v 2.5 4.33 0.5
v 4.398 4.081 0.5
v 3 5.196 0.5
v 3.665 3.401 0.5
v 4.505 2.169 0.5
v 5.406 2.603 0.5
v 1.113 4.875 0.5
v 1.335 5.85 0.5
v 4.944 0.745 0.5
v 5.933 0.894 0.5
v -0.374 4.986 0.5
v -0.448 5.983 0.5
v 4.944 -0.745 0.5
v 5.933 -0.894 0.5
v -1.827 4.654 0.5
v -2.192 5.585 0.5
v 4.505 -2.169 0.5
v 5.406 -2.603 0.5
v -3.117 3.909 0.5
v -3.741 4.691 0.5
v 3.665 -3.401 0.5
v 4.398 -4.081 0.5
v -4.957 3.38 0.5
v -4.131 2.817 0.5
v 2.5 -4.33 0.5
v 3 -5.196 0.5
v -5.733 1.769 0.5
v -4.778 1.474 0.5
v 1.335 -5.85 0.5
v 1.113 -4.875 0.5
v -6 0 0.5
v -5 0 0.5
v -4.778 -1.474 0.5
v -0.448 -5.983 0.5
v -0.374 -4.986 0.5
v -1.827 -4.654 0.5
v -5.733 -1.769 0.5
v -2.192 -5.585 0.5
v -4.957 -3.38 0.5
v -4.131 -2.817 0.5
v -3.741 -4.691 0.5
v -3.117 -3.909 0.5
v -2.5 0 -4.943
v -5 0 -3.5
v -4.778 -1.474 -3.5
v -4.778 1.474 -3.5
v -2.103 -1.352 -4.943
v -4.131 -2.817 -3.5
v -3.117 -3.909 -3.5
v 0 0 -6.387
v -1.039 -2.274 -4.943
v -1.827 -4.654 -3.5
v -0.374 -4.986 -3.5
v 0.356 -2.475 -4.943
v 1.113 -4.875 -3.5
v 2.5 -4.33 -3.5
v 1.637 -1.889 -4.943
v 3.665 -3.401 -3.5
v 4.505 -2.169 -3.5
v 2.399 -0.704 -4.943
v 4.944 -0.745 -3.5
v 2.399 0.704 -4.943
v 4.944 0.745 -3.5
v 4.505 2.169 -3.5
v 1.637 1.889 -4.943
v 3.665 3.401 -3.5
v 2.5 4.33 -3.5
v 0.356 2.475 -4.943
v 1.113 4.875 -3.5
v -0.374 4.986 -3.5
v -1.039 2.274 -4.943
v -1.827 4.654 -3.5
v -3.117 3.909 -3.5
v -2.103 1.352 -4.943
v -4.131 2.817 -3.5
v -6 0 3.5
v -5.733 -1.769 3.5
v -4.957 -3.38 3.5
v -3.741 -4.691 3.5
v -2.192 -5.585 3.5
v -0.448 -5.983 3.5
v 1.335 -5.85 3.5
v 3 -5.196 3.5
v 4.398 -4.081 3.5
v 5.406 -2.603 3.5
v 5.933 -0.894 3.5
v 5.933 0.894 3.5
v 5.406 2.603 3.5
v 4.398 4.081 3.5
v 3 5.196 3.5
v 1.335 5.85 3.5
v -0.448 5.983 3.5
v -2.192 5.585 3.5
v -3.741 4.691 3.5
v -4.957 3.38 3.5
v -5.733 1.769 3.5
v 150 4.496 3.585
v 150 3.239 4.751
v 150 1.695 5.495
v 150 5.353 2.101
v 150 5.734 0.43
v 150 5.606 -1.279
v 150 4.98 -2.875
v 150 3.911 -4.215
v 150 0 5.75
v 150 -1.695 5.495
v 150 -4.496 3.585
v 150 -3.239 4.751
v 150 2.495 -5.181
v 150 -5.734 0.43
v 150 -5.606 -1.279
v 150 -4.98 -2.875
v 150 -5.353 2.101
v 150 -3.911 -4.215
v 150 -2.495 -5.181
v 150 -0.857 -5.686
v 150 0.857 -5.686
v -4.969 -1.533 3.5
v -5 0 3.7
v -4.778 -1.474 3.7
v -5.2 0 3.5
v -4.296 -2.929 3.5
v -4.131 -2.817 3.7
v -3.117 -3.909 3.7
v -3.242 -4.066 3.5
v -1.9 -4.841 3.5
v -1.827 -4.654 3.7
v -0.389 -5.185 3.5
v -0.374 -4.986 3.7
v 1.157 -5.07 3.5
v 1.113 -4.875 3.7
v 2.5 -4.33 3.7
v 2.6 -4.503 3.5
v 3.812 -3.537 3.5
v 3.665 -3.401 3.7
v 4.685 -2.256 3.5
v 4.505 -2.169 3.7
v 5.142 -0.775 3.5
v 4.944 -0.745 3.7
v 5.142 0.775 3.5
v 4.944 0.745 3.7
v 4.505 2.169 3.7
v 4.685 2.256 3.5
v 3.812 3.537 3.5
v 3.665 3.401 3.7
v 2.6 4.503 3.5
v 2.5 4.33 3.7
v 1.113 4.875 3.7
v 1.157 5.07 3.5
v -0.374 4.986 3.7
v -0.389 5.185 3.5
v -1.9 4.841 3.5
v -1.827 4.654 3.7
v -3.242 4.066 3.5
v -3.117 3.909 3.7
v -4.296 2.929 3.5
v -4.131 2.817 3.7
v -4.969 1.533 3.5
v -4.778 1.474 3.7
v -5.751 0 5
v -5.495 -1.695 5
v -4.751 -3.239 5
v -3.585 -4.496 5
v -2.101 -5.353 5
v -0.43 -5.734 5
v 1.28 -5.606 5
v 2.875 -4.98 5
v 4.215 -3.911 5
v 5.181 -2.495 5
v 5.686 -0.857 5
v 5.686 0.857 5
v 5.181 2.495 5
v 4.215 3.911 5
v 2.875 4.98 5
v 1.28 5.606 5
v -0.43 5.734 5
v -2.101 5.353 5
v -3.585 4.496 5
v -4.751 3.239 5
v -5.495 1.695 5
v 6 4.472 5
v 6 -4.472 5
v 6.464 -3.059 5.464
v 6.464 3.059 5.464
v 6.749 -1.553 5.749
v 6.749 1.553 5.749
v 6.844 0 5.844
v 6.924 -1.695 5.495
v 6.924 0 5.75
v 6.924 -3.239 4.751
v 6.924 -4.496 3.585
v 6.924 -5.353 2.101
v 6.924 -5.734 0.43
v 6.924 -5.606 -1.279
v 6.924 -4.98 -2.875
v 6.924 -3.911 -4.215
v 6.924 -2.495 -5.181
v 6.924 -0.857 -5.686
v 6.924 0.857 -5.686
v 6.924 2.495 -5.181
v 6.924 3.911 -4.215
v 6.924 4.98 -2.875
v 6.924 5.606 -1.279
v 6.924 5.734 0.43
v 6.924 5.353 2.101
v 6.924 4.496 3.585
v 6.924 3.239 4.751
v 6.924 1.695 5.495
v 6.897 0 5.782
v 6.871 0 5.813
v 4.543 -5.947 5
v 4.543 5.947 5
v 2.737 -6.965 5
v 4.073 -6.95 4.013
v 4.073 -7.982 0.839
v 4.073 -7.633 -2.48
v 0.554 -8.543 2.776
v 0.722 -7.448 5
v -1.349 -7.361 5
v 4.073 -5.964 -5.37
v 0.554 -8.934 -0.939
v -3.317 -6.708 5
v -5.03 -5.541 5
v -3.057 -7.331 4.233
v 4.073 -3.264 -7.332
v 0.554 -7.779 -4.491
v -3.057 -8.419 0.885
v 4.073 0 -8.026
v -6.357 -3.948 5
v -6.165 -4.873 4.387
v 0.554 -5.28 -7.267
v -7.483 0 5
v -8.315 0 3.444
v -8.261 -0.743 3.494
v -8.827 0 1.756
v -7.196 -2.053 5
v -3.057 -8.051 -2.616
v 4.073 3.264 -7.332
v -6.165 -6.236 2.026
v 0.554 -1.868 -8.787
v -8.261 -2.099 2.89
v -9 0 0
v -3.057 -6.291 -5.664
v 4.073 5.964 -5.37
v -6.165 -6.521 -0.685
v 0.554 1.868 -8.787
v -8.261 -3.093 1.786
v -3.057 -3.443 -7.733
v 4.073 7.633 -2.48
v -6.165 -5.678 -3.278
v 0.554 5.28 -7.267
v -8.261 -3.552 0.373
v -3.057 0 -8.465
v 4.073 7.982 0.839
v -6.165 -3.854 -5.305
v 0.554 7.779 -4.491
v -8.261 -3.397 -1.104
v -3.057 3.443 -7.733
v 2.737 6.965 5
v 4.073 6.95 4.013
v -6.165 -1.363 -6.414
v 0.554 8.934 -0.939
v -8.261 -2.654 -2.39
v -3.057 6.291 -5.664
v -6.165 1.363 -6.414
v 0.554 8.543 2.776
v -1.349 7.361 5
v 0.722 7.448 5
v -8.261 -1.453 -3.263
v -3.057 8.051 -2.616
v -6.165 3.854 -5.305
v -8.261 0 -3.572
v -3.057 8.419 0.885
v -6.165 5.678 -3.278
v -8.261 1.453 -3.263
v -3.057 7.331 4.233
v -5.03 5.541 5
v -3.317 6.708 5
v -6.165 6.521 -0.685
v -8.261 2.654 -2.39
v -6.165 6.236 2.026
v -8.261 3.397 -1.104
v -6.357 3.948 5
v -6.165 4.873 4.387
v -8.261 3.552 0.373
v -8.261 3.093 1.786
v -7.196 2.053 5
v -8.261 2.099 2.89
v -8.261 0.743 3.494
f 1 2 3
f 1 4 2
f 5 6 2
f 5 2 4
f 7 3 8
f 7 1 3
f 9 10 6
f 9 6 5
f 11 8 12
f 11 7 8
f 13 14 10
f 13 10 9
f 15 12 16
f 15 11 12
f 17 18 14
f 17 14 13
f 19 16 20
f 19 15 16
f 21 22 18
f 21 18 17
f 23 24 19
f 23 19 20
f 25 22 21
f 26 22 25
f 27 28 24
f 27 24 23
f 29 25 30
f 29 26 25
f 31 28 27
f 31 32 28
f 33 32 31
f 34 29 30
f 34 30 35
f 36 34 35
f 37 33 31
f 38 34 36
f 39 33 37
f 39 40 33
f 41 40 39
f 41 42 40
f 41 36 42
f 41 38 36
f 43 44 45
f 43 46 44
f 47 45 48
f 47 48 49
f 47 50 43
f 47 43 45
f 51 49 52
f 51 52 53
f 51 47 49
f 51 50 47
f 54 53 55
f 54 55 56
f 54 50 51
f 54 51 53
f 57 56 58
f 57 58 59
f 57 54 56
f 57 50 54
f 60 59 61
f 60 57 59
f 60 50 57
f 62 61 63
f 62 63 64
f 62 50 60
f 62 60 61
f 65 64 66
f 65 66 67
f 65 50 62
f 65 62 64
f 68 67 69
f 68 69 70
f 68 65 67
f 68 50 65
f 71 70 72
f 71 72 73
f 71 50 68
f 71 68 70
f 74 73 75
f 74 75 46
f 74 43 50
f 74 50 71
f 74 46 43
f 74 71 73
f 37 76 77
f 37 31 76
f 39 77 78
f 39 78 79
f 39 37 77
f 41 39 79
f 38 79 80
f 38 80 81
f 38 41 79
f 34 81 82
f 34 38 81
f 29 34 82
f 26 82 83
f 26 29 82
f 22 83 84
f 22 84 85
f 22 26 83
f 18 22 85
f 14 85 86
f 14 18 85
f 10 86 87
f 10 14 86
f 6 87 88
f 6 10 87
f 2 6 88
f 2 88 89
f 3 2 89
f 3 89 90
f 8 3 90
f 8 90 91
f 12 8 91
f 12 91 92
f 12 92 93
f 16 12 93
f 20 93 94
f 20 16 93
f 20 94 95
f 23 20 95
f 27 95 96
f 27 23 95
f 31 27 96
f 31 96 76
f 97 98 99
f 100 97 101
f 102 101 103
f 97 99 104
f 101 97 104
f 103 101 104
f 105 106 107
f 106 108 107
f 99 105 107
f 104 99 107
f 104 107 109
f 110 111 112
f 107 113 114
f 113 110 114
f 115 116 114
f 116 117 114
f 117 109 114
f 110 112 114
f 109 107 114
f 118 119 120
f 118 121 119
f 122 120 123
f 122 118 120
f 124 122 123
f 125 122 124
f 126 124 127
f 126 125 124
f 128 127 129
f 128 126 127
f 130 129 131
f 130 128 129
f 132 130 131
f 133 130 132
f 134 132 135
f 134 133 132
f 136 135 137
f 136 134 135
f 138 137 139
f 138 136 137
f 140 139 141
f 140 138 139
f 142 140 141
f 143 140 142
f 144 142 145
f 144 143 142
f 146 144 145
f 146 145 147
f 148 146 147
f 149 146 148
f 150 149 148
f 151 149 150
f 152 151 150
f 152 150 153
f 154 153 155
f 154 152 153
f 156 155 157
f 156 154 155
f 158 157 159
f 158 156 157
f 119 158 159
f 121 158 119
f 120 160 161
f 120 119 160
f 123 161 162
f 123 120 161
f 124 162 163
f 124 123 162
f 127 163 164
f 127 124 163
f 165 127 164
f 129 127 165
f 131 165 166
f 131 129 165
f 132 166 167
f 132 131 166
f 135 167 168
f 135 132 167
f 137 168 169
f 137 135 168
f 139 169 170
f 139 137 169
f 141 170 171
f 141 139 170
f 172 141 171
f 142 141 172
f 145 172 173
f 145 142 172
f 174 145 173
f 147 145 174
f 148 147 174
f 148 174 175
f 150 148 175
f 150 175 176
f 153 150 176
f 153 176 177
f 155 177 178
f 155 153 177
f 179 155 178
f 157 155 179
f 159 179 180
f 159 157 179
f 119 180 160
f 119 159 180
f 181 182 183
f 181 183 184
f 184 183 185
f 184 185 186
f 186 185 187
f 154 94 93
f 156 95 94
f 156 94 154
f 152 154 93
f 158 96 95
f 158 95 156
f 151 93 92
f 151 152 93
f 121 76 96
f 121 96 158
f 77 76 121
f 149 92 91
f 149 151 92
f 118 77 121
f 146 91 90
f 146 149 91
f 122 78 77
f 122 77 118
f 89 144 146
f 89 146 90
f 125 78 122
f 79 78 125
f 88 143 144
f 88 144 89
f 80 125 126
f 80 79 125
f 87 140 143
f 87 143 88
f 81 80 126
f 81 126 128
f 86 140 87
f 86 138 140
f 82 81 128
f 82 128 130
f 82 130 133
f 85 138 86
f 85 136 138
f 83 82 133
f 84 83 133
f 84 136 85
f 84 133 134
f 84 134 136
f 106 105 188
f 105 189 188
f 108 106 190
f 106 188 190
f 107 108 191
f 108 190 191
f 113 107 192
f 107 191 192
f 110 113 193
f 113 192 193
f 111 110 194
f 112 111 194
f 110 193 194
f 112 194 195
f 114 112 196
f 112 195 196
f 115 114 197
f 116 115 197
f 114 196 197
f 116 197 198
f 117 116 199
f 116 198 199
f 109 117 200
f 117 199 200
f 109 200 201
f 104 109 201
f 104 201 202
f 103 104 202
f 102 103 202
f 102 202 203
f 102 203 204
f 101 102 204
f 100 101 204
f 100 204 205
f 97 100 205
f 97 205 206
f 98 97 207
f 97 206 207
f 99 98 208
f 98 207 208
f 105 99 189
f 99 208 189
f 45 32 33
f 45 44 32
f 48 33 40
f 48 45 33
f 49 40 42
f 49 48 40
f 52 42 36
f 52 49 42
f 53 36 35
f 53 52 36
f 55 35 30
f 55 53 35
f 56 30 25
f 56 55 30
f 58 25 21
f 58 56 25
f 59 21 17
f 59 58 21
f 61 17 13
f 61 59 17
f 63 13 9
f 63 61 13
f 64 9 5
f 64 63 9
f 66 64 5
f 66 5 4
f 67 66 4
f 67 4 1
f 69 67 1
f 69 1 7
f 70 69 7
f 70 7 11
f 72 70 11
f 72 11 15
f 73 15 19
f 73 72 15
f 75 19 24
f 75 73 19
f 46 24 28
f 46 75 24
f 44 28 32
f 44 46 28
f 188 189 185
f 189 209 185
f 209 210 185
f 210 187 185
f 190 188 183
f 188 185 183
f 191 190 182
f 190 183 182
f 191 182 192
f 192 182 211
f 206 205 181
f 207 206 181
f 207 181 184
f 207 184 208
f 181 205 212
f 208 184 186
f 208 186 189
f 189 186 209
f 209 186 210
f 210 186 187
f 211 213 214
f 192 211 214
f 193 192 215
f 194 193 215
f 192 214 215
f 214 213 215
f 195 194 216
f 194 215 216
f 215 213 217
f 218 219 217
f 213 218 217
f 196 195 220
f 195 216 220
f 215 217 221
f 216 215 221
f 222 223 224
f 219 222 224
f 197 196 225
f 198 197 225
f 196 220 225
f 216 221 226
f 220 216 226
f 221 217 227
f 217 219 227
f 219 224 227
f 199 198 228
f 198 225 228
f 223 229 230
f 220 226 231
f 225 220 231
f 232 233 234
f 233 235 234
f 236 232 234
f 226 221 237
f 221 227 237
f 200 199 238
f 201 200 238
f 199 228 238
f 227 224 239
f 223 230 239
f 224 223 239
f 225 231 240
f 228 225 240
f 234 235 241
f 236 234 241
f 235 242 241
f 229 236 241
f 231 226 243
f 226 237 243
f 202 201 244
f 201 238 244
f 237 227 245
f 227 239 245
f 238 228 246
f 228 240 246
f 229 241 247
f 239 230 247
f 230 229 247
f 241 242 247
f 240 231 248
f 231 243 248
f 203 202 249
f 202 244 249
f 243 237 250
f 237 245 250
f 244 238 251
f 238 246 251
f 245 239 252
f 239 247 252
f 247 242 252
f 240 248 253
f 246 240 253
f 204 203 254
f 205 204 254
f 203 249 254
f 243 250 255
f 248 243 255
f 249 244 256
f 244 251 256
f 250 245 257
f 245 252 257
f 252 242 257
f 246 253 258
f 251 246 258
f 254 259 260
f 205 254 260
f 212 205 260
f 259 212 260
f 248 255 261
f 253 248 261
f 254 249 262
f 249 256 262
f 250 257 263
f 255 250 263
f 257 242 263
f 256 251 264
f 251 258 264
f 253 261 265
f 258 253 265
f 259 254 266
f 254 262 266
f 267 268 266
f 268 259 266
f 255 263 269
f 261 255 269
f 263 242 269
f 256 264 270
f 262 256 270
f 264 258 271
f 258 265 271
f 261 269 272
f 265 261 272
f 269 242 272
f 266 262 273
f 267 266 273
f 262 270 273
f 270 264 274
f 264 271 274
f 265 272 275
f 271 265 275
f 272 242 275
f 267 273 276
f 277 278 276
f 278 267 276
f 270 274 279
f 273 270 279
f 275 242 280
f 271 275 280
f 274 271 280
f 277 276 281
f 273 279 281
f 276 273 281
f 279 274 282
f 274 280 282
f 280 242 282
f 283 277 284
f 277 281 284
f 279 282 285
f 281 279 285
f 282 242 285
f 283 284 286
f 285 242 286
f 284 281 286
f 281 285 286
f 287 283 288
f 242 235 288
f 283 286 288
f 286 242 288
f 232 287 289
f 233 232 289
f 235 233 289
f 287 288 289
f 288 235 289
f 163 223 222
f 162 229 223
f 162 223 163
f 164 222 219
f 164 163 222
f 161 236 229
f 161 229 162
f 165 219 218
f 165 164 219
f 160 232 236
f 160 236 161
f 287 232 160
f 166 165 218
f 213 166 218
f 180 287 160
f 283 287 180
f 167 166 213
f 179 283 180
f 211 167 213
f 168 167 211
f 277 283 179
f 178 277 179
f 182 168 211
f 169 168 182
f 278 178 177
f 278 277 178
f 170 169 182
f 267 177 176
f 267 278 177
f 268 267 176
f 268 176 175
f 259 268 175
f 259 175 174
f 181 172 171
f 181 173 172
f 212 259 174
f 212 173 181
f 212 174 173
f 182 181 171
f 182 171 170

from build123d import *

# Parameters (mm, degrees)
F3_DEPTH      = 25
F3_DEPTH_BACK = 25


with BuildPart() as f1:
    # F0 (on Front) → F1 (revolve)
    with BuildSketch(Plane.XZ):
        with BuildLine():
            Line((150, 5.75), (6.9236912121, 5.75))
            ThreePointArc((6.9236912121, 5.75), (-3.0566958543, 8.4650227675), (-9, 0))
            Line((-9, 0), (150, 0))
            Line((150, 0), (150, 5.75))
        make_face()
    revolve(axis=Axis((120.5487623811, 0, 0), (1, 0, 0)))

    # F2 (on Front) → F3 (cut, two sides)
    with BuildSketch(Plane.XZ) as f3_sk:
        Polygon((10, 9), (10, 10), (-10, 10), (-10, 5), (6, 5), align=None)
    extrude(amount=-F3_DEPTH, mode=Mode.SUBTRACT)
    extrude(f3_sk.sketch, amount=F3_DEPTH_BACK, mode=Mode.SUBTRACT)

    # F4 (on Front) → F5 (revolve, cut)
    with BuildSketch(Plane.XZ):
        Polygon((-5, -3.5), (0, -6.3867513459), (0, 5), (-5.7505553499, 5), (-5, 3.7), (-5.2, 3.5), (-6, 3.5), (-6, 0.5), (-5, 0.5), align=None)
    revolve(axis=Axis((0, 0, 6.4185173251), (0, 0, 1)), mode=Mode.SUBTRACT)


solid = f1.part
